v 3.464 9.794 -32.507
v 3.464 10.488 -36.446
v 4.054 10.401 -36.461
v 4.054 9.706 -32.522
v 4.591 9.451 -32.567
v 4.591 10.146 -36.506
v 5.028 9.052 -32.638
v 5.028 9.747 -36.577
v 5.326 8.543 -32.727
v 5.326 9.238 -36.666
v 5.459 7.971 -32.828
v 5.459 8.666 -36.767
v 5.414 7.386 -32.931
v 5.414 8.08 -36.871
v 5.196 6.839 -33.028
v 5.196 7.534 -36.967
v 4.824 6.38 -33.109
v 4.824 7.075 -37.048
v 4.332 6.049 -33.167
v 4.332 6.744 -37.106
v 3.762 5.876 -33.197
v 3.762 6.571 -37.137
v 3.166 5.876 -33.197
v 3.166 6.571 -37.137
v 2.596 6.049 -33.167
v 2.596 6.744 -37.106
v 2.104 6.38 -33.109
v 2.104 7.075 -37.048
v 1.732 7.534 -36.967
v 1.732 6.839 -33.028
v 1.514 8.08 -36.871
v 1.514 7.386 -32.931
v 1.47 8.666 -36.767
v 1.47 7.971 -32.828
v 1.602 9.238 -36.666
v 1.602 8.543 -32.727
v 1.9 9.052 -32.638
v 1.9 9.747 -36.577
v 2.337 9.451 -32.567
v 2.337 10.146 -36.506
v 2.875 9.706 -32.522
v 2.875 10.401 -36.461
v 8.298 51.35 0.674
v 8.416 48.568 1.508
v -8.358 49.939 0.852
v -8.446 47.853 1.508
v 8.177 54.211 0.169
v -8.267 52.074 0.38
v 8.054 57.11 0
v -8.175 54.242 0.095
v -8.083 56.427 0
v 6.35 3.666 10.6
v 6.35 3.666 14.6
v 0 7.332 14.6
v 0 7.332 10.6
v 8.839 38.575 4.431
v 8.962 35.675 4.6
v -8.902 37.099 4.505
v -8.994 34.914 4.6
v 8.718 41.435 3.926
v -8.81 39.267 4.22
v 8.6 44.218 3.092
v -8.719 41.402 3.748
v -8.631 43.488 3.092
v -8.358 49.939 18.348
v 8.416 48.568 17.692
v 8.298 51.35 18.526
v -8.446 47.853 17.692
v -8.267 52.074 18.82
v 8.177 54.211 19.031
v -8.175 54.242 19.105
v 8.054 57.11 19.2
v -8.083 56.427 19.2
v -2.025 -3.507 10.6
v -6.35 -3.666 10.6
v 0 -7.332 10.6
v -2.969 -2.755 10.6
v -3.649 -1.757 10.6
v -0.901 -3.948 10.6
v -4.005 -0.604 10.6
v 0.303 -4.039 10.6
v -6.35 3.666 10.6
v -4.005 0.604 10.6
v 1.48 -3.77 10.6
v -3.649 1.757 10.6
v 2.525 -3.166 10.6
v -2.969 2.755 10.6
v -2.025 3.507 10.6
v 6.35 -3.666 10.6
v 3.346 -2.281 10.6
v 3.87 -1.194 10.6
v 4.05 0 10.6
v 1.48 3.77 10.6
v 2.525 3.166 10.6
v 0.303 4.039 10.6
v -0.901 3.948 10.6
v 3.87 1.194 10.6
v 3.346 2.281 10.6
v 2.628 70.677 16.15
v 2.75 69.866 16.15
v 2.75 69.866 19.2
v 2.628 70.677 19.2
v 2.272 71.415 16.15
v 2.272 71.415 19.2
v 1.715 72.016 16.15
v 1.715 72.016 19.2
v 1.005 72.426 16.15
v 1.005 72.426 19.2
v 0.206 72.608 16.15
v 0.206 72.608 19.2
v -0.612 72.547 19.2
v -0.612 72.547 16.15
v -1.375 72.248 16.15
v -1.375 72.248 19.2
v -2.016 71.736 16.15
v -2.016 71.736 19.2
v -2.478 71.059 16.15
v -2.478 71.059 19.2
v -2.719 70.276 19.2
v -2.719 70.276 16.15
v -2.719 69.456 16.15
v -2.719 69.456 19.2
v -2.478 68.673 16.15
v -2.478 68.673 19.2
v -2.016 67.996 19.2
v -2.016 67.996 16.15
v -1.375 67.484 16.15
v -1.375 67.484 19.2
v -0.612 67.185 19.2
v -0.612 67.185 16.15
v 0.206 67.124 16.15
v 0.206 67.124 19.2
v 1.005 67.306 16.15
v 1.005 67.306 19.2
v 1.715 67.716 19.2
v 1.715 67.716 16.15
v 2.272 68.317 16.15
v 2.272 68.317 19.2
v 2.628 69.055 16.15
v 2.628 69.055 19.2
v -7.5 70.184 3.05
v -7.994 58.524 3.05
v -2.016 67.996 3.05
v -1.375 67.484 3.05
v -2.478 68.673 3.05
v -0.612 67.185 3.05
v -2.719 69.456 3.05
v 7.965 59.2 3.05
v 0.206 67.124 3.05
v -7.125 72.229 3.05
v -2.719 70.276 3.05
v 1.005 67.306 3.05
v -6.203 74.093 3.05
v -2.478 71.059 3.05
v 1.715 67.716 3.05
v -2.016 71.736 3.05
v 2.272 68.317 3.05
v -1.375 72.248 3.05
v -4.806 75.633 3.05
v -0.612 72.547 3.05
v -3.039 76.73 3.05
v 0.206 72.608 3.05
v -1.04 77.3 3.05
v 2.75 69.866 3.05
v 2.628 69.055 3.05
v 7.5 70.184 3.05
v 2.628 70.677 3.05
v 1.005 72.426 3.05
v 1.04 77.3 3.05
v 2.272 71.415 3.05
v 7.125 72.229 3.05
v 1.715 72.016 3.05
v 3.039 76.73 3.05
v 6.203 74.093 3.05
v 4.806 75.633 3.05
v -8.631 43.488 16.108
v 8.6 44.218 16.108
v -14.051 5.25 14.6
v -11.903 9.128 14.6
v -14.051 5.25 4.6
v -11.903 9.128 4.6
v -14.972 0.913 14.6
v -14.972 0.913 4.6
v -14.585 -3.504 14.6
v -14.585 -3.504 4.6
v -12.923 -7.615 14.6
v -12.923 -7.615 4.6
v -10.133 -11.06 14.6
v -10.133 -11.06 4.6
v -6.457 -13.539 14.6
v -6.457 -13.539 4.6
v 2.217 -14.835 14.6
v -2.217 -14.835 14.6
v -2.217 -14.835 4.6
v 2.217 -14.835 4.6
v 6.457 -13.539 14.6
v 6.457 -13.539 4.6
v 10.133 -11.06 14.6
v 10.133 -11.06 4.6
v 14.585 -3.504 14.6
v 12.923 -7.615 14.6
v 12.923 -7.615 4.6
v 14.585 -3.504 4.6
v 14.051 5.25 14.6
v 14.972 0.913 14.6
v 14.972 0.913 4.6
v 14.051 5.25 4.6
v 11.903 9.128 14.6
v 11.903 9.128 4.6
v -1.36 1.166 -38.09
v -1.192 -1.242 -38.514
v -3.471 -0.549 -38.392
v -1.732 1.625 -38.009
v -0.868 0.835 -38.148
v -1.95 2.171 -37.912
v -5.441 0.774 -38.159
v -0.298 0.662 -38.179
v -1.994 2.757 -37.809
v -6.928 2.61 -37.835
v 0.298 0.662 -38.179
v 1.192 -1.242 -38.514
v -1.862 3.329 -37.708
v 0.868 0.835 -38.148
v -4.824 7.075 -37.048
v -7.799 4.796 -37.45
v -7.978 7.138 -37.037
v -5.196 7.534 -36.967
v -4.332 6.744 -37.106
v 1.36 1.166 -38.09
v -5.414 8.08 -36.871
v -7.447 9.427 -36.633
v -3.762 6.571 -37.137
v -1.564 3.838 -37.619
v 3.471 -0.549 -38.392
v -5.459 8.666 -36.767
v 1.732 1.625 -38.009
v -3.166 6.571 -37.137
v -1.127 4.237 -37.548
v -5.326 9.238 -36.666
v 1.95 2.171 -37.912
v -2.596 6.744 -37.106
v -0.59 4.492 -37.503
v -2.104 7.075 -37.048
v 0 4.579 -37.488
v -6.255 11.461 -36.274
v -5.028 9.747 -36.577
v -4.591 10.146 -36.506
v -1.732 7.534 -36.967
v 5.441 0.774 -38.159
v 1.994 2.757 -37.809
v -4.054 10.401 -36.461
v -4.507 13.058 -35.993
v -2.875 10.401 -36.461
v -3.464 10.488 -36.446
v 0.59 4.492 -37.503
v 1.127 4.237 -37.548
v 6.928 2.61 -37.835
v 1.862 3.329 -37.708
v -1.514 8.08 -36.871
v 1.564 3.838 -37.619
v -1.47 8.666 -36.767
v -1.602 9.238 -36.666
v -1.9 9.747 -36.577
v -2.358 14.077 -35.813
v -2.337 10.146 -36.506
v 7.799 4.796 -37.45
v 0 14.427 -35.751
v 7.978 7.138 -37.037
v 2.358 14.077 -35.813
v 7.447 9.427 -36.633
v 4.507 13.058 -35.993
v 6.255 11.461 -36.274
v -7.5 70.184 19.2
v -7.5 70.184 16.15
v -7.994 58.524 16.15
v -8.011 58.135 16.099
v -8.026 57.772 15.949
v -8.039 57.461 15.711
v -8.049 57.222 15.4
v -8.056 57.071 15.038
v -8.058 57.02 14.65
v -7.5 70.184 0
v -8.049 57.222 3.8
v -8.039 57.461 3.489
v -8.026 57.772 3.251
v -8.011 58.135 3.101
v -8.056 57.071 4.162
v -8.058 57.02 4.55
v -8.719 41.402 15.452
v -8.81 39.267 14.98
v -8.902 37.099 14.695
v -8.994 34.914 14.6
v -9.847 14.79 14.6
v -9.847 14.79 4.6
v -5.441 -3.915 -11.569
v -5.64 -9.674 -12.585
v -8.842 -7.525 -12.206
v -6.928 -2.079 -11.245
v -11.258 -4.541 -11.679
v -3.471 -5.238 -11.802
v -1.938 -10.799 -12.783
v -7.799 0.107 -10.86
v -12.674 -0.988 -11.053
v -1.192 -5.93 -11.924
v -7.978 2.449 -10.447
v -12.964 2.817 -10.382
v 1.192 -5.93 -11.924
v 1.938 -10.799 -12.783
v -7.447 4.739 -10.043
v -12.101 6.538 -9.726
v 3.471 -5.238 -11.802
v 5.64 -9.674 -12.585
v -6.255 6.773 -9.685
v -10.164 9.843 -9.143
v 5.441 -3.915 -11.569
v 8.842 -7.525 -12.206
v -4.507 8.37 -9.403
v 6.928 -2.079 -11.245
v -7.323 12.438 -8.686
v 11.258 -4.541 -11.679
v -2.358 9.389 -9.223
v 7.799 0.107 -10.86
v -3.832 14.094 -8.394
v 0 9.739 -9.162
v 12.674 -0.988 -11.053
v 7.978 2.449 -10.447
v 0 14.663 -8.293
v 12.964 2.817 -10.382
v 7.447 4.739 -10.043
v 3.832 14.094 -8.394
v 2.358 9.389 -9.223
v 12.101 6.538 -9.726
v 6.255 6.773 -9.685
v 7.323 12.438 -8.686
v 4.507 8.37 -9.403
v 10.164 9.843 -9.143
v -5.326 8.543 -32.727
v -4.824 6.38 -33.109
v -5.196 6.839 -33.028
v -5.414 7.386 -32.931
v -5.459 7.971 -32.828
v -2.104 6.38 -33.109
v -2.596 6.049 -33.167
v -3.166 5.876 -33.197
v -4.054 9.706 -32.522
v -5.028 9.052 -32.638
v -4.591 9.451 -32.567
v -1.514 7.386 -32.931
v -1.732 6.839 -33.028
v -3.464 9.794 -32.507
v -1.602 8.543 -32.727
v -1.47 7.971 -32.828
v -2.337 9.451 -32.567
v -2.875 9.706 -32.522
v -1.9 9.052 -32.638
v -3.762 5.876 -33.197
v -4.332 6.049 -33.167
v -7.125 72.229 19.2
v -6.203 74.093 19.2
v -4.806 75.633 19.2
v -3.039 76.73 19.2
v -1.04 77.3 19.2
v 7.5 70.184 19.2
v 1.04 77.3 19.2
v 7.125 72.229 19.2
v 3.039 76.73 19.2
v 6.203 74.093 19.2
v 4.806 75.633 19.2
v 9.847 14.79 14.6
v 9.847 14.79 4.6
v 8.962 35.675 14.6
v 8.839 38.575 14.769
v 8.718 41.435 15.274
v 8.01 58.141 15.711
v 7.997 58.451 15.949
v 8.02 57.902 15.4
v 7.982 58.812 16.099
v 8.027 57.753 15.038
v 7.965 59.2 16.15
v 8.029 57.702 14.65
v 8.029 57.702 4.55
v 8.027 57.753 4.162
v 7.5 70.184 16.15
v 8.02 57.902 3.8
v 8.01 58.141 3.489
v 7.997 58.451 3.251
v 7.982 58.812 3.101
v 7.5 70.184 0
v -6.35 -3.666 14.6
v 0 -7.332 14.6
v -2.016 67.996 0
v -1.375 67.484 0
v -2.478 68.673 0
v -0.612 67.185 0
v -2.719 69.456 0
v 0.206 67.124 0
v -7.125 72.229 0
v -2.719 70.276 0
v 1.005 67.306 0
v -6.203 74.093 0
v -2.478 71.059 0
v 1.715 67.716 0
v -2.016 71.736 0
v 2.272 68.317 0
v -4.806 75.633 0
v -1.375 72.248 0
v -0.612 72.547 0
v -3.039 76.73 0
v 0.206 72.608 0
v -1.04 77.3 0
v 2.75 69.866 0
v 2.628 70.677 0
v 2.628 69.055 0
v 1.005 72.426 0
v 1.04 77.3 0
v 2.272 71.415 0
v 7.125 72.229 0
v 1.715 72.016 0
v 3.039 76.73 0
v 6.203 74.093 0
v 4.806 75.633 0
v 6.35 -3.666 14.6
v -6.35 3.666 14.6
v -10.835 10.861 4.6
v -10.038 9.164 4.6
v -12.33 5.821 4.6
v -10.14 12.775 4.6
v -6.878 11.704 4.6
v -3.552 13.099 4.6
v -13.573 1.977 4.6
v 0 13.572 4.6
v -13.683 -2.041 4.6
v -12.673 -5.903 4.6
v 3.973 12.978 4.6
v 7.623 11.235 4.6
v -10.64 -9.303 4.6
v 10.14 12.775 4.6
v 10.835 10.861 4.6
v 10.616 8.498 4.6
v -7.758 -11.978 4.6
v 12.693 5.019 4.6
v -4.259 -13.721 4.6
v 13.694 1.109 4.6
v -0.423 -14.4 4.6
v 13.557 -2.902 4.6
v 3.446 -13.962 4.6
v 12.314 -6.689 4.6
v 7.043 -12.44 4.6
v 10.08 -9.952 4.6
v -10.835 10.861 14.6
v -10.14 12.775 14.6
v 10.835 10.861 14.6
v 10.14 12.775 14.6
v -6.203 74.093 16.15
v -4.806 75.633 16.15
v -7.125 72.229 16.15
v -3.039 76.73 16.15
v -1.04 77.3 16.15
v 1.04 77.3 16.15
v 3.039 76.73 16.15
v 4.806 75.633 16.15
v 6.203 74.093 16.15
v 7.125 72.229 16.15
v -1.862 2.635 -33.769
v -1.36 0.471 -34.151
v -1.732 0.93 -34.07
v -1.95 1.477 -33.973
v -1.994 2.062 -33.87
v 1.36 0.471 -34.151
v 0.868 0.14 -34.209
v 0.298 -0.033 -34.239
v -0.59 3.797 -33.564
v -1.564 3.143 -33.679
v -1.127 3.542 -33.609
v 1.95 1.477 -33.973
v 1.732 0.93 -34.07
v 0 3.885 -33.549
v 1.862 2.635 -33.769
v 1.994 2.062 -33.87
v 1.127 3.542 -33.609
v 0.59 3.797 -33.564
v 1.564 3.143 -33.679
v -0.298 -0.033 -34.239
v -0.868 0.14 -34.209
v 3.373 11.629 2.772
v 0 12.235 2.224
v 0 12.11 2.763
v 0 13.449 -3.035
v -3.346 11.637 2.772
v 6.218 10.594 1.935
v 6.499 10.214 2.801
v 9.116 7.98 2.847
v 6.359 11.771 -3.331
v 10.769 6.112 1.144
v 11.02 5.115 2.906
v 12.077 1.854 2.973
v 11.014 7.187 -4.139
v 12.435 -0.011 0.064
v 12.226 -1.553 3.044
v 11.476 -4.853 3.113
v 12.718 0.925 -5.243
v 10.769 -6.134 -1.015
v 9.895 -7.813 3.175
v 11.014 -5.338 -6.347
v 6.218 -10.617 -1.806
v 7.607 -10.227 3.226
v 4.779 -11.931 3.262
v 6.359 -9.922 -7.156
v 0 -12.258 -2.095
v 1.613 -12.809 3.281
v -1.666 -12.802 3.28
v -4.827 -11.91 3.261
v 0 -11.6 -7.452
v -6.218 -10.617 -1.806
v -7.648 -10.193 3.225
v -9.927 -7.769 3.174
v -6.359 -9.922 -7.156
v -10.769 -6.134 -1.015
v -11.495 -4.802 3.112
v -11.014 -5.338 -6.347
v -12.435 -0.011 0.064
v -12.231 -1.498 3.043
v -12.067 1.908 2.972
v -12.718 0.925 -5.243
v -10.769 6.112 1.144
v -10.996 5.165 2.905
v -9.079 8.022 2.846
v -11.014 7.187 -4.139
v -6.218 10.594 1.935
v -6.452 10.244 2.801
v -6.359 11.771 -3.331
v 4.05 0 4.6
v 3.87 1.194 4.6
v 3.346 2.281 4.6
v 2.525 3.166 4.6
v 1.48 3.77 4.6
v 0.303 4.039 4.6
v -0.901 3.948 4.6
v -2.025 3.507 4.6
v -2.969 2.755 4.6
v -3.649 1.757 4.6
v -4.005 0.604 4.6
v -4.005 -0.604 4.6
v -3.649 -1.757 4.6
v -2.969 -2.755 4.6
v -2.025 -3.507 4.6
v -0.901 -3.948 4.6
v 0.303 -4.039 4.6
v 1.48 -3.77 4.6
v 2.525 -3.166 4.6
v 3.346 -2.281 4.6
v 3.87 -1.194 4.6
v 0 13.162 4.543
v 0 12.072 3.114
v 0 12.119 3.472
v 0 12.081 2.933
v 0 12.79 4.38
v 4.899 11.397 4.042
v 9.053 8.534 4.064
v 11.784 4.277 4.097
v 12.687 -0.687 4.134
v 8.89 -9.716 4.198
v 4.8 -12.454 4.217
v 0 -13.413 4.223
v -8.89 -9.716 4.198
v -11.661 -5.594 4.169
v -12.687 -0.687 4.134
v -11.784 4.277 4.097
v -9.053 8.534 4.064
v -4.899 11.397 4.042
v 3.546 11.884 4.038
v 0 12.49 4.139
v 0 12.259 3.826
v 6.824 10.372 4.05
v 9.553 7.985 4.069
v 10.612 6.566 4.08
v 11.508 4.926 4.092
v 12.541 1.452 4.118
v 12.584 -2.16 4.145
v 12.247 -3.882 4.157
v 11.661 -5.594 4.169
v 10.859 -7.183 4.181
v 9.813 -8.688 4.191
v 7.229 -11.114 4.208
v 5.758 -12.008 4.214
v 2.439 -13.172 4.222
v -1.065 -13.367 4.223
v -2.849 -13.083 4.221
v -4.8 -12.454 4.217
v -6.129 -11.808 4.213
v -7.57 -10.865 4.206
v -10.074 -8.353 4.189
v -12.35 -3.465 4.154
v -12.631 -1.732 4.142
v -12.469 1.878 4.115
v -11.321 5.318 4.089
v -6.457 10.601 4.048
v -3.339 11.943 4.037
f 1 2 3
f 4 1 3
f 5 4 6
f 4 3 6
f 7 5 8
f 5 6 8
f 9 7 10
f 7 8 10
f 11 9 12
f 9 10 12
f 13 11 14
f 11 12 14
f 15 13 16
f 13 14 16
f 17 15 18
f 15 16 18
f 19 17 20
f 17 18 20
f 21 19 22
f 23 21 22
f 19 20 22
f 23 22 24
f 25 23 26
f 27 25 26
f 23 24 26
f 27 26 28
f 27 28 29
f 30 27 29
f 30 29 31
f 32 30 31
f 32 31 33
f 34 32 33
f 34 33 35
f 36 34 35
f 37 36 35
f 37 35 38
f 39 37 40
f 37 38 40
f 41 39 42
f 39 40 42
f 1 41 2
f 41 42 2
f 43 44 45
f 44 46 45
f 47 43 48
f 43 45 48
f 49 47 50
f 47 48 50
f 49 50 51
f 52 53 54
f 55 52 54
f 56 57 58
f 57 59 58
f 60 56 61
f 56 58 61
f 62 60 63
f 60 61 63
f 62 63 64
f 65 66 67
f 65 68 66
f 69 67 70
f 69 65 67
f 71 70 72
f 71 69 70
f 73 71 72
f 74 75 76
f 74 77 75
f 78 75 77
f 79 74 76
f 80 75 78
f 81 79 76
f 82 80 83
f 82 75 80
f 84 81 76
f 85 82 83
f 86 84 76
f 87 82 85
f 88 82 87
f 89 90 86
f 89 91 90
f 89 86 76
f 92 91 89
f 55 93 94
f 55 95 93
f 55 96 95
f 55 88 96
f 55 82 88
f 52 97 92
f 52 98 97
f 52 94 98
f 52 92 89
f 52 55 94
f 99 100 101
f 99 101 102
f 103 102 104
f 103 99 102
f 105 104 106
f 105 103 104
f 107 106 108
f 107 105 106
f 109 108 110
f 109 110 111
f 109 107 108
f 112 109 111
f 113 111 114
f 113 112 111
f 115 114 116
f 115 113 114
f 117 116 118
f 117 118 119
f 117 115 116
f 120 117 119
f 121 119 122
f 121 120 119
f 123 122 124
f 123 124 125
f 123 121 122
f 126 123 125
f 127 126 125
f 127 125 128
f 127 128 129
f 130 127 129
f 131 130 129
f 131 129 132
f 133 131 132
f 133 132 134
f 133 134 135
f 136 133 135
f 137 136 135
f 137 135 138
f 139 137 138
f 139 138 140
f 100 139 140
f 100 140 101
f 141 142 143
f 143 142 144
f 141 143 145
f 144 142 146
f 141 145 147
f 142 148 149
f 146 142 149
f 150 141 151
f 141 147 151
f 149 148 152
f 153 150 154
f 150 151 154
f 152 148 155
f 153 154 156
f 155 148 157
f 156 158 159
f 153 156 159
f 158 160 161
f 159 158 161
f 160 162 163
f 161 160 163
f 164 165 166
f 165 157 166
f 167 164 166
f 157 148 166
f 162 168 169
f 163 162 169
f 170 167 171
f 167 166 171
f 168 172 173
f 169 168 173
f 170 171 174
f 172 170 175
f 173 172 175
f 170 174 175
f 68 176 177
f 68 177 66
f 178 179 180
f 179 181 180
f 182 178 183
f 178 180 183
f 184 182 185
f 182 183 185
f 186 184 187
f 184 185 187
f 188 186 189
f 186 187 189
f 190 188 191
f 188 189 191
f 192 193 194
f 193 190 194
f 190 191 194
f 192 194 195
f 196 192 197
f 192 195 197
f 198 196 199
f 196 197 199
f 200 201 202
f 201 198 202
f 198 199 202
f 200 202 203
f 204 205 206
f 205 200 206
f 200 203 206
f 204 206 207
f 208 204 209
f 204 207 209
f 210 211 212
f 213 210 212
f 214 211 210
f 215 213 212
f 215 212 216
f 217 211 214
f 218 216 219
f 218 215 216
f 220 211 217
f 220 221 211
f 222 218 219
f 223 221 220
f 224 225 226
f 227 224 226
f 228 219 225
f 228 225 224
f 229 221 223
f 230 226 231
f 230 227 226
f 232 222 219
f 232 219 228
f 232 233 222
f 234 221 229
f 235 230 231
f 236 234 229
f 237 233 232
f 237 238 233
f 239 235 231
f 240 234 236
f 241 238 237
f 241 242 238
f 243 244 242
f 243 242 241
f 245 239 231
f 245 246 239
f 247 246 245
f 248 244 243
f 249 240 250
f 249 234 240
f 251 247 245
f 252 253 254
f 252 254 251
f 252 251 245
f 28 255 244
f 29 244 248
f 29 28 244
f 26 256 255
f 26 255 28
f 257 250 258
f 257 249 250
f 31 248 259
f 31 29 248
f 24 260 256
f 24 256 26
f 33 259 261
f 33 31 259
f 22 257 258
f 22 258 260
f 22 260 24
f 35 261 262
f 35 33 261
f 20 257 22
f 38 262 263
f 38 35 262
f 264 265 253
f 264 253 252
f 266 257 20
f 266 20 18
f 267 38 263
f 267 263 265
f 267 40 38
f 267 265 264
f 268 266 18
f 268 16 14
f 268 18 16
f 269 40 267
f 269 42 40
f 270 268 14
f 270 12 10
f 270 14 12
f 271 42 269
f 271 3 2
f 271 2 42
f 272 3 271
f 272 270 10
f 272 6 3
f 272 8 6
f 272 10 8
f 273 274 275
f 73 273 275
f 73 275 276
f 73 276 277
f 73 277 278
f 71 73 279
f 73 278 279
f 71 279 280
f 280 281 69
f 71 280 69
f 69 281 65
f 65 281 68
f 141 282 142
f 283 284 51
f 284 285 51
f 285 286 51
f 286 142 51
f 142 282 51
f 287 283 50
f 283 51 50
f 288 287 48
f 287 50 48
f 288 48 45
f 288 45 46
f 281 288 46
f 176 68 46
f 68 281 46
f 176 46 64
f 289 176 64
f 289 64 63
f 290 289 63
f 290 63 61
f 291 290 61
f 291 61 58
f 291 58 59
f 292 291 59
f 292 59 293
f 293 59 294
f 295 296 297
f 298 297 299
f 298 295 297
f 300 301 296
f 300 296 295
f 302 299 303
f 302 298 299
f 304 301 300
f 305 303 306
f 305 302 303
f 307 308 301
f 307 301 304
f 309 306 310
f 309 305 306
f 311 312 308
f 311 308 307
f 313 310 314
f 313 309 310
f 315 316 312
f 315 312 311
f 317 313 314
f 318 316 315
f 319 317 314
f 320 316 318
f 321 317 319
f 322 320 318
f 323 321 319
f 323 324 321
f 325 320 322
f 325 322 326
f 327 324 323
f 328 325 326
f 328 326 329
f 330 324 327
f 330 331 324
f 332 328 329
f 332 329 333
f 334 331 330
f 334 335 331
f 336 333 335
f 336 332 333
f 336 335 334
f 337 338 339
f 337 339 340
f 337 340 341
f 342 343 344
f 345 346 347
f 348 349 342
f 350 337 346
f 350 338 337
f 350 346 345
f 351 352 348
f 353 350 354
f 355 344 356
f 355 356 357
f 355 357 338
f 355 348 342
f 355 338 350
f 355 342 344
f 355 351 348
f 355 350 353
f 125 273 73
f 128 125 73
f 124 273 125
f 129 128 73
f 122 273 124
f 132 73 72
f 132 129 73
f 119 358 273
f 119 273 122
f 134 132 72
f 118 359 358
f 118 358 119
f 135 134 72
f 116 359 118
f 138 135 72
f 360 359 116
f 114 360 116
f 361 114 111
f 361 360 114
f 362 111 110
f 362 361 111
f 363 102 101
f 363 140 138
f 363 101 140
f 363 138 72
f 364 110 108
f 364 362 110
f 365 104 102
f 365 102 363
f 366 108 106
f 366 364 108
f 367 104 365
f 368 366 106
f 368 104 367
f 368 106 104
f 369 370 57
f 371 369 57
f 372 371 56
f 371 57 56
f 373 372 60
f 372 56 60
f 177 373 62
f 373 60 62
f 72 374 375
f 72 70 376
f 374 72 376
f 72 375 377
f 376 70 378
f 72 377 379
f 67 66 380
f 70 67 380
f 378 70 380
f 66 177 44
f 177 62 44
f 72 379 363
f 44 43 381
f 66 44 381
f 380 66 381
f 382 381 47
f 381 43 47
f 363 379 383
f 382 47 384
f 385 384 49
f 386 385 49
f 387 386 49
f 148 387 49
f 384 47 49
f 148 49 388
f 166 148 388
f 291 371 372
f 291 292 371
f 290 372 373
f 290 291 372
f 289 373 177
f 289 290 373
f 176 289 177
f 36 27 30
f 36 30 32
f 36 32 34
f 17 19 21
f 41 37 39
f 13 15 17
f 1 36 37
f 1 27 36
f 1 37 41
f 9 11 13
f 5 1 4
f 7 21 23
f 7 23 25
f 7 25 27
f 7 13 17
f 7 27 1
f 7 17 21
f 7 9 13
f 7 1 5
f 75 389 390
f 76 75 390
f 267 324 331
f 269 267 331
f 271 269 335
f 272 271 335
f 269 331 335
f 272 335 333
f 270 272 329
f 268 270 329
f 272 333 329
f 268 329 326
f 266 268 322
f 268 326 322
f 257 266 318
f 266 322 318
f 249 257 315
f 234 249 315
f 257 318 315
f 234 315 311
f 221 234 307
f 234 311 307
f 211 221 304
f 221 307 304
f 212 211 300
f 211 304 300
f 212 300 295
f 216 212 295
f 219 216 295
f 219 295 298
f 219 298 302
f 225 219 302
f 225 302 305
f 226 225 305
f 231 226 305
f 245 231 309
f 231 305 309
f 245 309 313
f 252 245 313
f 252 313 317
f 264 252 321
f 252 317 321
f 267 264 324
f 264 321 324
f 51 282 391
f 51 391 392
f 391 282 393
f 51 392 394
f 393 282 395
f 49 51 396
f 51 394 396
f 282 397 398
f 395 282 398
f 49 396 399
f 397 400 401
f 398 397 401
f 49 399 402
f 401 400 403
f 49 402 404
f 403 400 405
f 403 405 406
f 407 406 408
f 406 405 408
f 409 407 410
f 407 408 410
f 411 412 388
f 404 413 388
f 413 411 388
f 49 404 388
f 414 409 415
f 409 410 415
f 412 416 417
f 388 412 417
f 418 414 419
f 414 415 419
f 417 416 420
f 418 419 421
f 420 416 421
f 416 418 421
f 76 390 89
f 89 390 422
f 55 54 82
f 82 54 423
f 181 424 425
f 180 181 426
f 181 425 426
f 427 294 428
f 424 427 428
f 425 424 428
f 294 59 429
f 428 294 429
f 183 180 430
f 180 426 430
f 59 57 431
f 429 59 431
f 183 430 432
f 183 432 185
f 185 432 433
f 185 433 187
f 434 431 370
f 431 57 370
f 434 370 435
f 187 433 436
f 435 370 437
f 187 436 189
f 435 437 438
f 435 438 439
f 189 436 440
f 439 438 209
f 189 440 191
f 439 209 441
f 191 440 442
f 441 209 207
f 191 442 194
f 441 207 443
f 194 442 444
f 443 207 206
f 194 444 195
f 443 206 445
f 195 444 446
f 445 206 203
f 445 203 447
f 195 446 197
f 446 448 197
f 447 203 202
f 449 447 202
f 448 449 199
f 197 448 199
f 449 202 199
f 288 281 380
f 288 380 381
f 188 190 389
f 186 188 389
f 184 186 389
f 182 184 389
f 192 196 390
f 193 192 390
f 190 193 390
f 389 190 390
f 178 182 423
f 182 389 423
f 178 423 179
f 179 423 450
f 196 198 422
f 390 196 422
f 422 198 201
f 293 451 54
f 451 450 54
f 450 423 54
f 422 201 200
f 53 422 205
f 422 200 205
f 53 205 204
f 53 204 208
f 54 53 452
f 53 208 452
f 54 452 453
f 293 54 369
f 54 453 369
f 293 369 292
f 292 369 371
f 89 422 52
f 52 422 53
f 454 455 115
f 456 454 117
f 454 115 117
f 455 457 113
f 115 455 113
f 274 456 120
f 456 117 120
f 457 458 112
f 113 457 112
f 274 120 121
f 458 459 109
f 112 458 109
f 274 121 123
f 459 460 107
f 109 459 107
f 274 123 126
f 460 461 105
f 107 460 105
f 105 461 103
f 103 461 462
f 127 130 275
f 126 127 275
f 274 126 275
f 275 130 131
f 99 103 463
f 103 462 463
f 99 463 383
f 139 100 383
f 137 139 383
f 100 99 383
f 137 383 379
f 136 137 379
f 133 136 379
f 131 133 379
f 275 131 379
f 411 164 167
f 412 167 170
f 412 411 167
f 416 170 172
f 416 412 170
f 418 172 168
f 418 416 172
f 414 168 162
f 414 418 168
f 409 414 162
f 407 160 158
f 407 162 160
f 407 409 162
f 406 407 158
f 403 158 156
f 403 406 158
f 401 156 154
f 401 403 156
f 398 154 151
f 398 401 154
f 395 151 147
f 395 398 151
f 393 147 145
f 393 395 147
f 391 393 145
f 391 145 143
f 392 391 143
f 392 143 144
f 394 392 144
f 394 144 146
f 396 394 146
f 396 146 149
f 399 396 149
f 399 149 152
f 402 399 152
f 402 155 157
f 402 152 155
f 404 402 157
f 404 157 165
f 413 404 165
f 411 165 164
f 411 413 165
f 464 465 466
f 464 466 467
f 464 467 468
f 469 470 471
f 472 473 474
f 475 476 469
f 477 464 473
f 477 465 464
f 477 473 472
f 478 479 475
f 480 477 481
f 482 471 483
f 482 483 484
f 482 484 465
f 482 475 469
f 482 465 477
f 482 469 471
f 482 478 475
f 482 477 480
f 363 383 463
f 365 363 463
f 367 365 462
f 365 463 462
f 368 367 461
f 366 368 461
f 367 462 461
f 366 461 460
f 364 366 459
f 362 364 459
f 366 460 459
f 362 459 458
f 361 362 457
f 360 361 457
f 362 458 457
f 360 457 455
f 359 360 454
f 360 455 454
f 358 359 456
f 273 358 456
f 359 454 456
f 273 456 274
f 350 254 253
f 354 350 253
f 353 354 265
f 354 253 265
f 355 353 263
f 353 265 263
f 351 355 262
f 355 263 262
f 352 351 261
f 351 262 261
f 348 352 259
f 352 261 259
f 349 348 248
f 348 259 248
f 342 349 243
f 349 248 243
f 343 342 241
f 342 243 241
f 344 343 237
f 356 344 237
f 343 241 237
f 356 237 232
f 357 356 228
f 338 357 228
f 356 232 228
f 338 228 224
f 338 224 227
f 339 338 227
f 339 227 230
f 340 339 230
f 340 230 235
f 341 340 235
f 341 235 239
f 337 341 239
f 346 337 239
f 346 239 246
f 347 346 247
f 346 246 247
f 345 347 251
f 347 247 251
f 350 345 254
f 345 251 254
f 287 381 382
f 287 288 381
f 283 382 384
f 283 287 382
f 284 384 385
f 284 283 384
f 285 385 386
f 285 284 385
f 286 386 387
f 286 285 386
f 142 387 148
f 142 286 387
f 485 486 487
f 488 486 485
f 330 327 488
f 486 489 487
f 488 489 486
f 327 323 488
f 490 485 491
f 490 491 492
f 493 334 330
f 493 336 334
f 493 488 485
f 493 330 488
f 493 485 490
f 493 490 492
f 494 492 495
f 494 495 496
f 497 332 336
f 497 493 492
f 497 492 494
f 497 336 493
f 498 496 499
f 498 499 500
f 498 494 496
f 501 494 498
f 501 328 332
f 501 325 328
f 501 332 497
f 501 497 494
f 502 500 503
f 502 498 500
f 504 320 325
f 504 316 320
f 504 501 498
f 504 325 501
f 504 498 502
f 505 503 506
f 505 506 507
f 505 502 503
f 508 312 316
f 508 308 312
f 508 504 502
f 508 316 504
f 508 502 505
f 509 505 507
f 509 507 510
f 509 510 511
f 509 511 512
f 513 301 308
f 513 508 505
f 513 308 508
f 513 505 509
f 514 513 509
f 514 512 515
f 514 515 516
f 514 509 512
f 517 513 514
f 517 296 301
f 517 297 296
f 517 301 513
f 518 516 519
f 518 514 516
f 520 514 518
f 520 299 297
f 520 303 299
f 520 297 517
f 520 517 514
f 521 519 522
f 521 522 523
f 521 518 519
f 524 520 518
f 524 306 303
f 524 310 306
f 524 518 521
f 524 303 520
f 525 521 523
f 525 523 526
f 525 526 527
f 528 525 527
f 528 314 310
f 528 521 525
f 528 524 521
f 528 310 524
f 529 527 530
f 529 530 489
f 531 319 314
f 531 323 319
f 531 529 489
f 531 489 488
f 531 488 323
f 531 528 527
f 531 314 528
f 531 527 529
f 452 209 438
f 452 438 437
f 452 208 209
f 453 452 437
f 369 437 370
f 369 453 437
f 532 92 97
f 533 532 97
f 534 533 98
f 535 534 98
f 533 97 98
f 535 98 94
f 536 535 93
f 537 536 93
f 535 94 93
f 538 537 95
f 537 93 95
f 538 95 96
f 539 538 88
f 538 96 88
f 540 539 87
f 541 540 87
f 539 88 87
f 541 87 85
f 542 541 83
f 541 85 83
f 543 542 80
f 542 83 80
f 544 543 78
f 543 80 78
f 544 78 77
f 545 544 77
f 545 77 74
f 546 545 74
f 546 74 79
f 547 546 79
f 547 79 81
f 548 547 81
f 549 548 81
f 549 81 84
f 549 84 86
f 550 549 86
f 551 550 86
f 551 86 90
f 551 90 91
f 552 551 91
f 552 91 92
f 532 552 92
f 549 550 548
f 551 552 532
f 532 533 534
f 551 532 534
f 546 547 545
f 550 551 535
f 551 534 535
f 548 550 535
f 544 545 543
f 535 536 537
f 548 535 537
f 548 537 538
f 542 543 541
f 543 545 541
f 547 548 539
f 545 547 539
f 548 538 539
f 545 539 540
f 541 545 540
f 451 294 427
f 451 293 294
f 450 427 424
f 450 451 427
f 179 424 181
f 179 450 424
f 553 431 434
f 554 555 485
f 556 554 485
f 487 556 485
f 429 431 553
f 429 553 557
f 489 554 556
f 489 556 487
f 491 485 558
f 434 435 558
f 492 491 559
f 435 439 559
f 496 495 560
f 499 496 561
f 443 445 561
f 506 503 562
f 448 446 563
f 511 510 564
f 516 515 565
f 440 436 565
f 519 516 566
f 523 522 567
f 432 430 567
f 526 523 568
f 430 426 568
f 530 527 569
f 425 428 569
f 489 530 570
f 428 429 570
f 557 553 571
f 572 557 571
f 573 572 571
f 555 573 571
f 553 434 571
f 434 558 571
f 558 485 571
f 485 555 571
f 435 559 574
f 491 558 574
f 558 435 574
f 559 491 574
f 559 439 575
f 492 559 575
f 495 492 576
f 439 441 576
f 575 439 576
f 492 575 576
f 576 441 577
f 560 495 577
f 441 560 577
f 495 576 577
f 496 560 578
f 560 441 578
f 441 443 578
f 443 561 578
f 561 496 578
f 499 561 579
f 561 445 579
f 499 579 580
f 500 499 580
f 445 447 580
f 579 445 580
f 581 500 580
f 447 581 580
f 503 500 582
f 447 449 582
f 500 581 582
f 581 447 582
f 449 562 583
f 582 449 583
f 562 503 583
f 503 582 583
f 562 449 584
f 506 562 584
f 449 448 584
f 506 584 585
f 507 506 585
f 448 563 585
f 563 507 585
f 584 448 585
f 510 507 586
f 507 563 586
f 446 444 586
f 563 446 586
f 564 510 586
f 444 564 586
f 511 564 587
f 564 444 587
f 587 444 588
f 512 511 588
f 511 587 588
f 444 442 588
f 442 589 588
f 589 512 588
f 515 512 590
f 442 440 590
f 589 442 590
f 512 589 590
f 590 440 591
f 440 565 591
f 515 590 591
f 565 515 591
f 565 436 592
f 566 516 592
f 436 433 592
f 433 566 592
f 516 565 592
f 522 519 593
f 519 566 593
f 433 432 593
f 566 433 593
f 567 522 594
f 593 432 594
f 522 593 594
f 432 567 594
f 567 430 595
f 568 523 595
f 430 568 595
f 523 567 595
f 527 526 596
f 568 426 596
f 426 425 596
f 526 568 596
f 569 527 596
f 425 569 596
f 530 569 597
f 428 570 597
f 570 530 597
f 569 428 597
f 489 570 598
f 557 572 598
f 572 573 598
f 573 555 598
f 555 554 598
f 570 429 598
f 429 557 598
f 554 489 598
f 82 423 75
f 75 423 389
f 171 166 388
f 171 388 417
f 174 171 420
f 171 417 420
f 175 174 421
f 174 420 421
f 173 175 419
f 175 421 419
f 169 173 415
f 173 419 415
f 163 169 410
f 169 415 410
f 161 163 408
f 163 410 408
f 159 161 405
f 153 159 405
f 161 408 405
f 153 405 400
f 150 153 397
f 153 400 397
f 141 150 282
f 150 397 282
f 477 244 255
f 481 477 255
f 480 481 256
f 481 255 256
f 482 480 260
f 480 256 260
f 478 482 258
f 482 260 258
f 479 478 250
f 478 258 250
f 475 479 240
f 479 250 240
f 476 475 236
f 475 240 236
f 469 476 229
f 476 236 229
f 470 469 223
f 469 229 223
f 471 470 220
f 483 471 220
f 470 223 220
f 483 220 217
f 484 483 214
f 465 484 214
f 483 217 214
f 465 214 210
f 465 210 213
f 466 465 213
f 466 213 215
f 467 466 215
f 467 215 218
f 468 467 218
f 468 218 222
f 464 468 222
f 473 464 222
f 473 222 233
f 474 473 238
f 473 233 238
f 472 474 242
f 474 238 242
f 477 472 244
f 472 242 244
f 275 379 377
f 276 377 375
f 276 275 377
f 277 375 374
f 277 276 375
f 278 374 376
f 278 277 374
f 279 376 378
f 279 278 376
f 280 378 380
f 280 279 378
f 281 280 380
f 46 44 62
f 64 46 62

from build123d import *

# Parameters (mm, degrees)
SKETCH1_R               = 2.75
BOSS_EXTRUDE1_DEPTH     = 19.2
SKETCH13_OUTSIDE_W      = 41
SKETCH13_OUTSIDE_H      = 115.36
CUT_EXTRUDE4_DEPTH      = 84.275329734
CUT_EXTRUDE4_DEPTH_BACK = 84.275329734
CUT_EXTRUDE2_DEPTH      = 4
SKETCH4_R               = 4.05
CUT_EXTRUDE3_DEPTH      = 20
FILLET4_R               = 10
BOSS_EXTRUDE2_REACH     = 83.7
SKETCH9_R               = 13
SKETCH10_R              = 8
BOSS_EXTRUDE3_DEPTH     = 27
DRAFT1_ANGLE            = -3
FILLET5_R               = 25
SKETCH14_R              = 2
CUT_EXTRUDE5_DEPTH      = 4
FILLET6_R               = 1.5


with BuildPart() as part:
    # Sketch1 → Boss-Extrude1 (new body)
    with BuildSketch(Plane.XY):
        with BuildLine():
            Line((-7.5, 70.183778092), (-10, 11.180339887))
            ThreePointArc((-10, 11.180339887), (0, -15), (10, 11.180339887))
            Line((10, 11.180339887), (7.5, 70.183778092))
            ThreePointArc((7.5, 70.183778092), (0, 77.372729176), (-7.5, 70.183778092))
        make_face()
        with Locations((0, 69.866)):
            Circle(SKETCH1_R, mode=Mode.SUBTRACT)
    extrude(amount=BOSS_EXTRUDE1_DEPTH)

    # Sketch13 outside → Cut-Extrude4 (cut, two sides)
    with BuildSketch(Plane(origin=(10.454946348, 0.442980387, 0), x_dir=(0, 0, -1), z_dir=(0.9991035808766652, 0.042332430587259585, 0))) as cut_extrude4_sk:
        with Locations((-9.6, 31.158)):
            Rectangle(SKETCH13_OUTSIDE_W, SKETCH13_OUTSIDE_H)
        Polygon((-16.15, 77.310099957), (-16.15, 57.310099957), (-3.05, 57.310099957), (-3.05, 77.310099957), (0, 77.310099957), (0, 52.310099957), (-4.6, 39.671703828), (-4.6, -15), (-14.6, -15), (-14.6, 39.671703828), (-19.2, 52.310099957), (-19.2, 77.310099957), align=None, mode=Mode.SUBTRACT)
    extrude(amount=CUT_EXTRUDE4_DEPTH, mode=Mode.SUBTRACT)
    extrude(cut_extrude4_sk.sketch, amount=-CUT_EXTRUDE4_DEPTH_BACK, mode=Mode.SUBTRACT)

    # Sketch3 → Cut-Extrude2 (cut)
    with BuildSketch(Plane.XY.offset(14.6)):
        Polygon((0, 7.332348419), (-6.35, 3.666174209), (-6.35, -3.666174209), (0, -7.332348419), (6.35, -3.666174209), (6.35, 3.666174209), align=None)
    extrude(amount=-CUT_EXTRUDE2_DEPTH, mode=Mode.SUBTRACT)

    # Sketch4 → Cut-Extrude3 (cut)
    with BuildSketch(Plane.XY.offset(10.6)):
        Circle(SKETCH4_R)
    extrude(amount=-CUT_EXTRUDE3_DEPTH, mode=Mode.SUBTRACT)

    # Fillet4
    fillet4_edges = [part.edges().sort_by_distance(p)[0] for p in [
        (10, 11.180339887, 9.6),
        (-10, 11.180339887, 9.6),
    ]]
    fillet(fillet4_edges, radius=FILLET4_R)

    # Boss-Extrude2: up to this plane
    boss_extrude2_end = Plane(origin=(-17.286936373, 38.974843589, 4.6), z_dir=(0, 0, -1))
    # Sketch9 → Boss-Extrude2 (add, up to the surface)
    with BuildSketch(Plane(origin=(0, 2.715435503, -10.4), x_dir=(-1, 0, 0), z_dir=(0, 0.17364817766692367, -0.9848077530122092)), mode=Mode.PRIVATE) as boss_extrude2_sk1:
        with Locations(Location((0, -0.868240888, 0), (0, 0, 90))):
            Circle(SKETCH9_R)
    boss_extrude2_tool1 = split(extrude(boss_extrude2_sk1.sketch, amount=-BOSS_EXTRUDE2_REACH, mode=Mode.PRIVATE), bisect_by=boss_extrude2_end, keep=Keep.BOTH, mode=Mode.PRIVATE)
    add(boss_extrude2_tool1.solids().sort_by_distance((0, 1.860385, -10.550768))[0])

    # Sketch10 → Boss-Extrude3 (add)
    with BuildSketch(Plane(origin=(0, 1.860385145, -10.550768448), x_dir=(-1, 0, 0), z_dir=(0, 0.17364817766692367, -0.9848077530122092))):
        with Locations(Location((0, 0, 0), (0, 0, 90))):
            Circle(SKETCH10_R)
    extrude(amount=BOSS_EXTRUDE3_DEPTH)

    # Draft1
    draft1_faces = [part.faces().sort_by_distance(p)[0] for p in [
        (0, -12.485127219, -4.05734127),
    ]]
    draft(draft1_faces, Plane(origin=(0, 1.860385145, -10.550768448), x_dir=(0, -0.9848077530122092, -0.17364817766692367), z_dir=(0, 0.17364817766692367, -0.9848077530122092)), DRAFT1_ANGLE)

    # Fillet5
    fillet5_edges = [part.edges().sort_by_distance(p)[0] for p in [
        (-0.01578265, 39.706629492, 4.6),
        (-0.01578265, 39.706629492, 14.6),
        (-0.014820438, 52.356405855, 19.2),
        (-0.014820438, 52.356405855, 0),
    ]]
    fillet(fillet5_edges, radius=FILLET5_R)

    # Sketch14 → Cut-Extrude5 (cut)
    with BuildSketch(Plane(origin=(0, 6.548885942, -37.140577779), x_dir=(-1, 0, 0), z_dir=(0, 0.17364817766692367, -0.9848077530122092))):
        with Locations(Location((-3.464101615, 2, 0), (0, 0, 90))):
            Circle(SKETCH14_R)
        with Locations(Location((3.464101615, 2, 0), (0, 0, 90))):
            Circle(SKETCH14_R)
        with Locations(Location((0, -4, 0), (0, 0, 90))):
            Circle(SKETCH14_R)
    extrude(amount=-CUT_EXTRUDE5_DEPTH, mode=Mode.SUBTRACT)

    # Fillet6
    fillet6_edges = [part.edges().sort_by_distance(p)[0] for p in [
        (-9.82e-07, -13.079573194, 4.6),
        (-0.014439768, 57.360908102, 3.05),
        (-0.014439768, 57.360908102, 16.15),
    ]]
    fillet(fillet6_edges, radius=FILLET6_R)


solid = part.part
